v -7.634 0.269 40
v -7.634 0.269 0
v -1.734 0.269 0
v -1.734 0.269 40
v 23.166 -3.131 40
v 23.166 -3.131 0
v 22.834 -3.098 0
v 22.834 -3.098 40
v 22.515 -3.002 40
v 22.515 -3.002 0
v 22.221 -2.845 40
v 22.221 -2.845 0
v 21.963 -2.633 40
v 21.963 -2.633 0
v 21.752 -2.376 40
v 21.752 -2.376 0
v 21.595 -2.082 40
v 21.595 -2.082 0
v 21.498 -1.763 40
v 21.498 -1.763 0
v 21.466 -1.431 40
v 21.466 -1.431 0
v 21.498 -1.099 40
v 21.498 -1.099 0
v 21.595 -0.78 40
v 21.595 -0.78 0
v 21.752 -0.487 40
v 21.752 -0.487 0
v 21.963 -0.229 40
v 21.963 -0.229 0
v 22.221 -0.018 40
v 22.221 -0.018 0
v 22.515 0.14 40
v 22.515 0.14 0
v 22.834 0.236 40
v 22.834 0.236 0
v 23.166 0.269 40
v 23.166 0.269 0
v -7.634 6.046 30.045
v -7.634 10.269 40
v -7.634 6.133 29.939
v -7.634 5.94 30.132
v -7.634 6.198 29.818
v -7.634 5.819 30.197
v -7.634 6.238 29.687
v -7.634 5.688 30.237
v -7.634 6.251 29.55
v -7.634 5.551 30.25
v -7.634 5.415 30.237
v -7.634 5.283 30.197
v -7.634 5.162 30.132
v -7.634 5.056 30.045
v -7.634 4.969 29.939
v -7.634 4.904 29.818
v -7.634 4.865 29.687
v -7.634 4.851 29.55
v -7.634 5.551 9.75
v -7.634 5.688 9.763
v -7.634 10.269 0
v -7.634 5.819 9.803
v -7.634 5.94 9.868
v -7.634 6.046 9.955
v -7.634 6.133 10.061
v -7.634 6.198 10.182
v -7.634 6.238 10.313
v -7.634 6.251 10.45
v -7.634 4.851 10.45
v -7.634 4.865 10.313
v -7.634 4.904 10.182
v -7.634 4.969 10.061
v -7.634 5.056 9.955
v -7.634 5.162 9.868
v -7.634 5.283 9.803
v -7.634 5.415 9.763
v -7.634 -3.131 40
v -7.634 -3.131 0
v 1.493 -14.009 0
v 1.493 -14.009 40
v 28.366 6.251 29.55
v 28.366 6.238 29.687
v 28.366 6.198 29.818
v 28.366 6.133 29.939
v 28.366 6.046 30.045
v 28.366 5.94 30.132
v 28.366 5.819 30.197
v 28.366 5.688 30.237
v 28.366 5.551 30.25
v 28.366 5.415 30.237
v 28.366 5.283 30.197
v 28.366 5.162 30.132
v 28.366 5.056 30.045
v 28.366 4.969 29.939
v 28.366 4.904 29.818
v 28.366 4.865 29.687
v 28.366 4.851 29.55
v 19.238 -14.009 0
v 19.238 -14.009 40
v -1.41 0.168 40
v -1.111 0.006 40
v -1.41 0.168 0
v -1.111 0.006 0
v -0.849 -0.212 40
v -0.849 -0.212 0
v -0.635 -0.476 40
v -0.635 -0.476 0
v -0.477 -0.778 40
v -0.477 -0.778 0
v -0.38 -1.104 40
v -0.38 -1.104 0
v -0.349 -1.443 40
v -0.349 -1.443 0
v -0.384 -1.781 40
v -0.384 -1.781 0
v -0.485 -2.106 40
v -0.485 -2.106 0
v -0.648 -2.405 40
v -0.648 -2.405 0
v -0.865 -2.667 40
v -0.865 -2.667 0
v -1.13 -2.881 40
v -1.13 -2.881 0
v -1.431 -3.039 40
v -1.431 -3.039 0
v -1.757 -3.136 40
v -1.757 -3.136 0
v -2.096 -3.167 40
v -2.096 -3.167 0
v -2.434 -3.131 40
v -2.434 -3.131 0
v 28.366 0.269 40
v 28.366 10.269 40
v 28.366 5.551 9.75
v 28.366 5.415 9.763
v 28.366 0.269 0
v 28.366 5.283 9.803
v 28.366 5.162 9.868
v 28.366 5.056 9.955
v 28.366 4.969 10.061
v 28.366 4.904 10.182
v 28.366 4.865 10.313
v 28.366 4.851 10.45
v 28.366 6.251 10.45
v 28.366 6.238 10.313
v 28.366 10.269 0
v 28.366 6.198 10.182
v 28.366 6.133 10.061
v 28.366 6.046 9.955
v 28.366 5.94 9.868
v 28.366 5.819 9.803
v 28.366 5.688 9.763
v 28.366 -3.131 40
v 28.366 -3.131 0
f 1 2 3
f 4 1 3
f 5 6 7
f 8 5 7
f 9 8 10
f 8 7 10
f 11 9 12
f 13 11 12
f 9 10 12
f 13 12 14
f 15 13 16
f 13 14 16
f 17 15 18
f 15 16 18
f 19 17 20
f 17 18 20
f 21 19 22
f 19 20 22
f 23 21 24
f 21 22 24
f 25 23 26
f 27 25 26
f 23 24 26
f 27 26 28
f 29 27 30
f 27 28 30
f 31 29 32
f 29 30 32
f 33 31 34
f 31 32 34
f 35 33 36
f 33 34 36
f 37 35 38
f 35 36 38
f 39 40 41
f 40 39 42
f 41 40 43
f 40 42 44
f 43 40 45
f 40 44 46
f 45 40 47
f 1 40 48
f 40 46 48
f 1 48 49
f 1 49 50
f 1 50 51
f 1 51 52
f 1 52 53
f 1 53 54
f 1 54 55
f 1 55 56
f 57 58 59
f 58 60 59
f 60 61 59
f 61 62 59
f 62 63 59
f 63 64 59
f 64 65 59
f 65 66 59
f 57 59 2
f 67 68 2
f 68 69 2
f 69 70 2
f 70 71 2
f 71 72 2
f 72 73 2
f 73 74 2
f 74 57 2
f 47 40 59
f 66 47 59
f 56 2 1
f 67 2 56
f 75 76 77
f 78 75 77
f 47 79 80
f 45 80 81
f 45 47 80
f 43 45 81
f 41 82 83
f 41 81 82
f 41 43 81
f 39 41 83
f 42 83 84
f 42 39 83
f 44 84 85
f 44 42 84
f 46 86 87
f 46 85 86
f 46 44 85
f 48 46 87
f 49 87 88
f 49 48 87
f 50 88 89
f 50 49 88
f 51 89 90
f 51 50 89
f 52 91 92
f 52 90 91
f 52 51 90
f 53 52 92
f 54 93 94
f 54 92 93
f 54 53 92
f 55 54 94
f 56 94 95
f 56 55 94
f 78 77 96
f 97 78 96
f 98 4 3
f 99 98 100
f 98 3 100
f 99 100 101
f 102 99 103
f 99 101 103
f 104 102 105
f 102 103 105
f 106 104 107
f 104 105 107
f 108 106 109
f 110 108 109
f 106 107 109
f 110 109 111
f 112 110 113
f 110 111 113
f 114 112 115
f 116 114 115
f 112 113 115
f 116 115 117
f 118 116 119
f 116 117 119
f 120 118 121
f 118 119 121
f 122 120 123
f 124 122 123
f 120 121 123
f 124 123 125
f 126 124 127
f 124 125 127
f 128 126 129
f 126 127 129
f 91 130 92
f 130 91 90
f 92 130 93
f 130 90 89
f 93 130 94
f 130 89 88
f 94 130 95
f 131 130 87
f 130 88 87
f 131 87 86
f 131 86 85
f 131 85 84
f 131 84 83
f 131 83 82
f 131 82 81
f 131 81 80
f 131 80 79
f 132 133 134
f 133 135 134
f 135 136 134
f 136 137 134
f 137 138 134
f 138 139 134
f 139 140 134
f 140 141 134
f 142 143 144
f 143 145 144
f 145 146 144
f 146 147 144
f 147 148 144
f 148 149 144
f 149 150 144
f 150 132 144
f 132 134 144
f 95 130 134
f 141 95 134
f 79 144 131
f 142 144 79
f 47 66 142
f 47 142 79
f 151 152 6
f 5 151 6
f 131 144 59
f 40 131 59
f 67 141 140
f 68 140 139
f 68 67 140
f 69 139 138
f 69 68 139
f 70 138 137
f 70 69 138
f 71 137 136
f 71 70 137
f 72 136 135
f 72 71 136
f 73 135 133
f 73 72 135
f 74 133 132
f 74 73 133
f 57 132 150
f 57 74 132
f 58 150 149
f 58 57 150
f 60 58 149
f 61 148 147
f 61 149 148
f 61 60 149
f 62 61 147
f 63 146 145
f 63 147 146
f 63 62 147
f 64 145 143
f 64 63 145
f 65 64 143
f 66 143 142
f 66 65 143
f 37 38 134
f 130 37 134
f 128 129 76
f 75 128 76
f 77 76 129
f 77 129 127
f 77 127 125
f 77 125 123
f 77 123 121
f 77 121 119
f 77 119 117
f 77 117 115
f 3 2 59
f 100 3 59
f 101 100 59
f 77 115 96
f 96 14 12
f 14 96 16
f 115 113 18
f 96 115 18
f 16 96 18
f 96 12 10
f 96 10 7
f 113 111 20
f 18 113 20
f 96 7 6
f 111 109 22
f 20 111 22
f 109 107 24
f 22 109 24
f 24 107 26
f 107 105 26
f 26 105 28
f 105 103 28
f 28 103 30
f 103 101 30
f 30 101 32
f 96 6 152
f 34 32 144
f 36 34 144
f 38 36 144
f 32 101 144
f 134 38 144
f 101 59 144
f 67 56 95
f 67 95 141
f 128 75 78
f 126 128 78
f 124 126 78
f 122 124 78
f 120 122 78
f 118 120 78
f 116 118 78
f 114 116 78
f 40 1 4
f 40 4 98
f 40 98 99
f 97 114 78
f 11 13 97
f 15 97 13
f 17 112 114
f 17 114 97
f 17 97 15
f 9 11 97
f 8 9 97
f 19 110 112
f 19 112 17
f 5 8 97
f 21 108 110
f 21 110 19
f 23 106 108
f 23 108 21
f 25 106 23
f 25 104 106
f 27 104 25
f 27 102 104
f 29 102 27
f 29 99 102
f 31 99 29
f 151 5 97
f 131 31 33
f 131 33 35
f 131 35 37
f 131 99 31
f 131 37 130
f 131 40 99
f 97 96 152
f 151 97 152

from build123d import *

# Parameters (mm, degrees)
BOSS_EXTRUDE3_DEPTH = 40
CUT_EXTRUDE1_DEPTH  = 72


# Read off the part's stored shape, not the designer's step: Boss-Extrude3
with BuildPart() as part:
    # Boss-Extrude3 outline → Boss-Extrude3 (new body)
    with BuildSketch(Plane.XY):
        with BuildLine():
            Line((28.365517241, -3.131034483), (23.165517241, -3.131034483))
            ThreePointArc((23.165517241, -3.131034483), (21.465517241, -1.431034483), (23.165517241, 0.268965517))
            Line((23.165517241, 0.268965517), (28.365517241, 0.268965517))
            Line((28.365517241, 0.268965517), (28.365517241, 10.268965517))
            Line((28.365517241, 10.268965517), (-7.634482759, 10.268965517))
            Line((-7.634482759, 10.268965517), (-7.634482759, 0.268965517))
            Line((-7.634482759, 0.268965517), (-1.734482759, 0.268965517))
            ThreePointArc((-1.734482759, 0.268965517), (-0.384482759, -1.781034483), (-2.434482759, -3.131034483))
            Line((-2.434482759, -3.131034483), (-7.634482759, -3.131034483))
            Line((-7.634482759, -3.131034483), (1.493101299, -14.008865575))
            Line((1.493101299, -14.008865575), (19.237933184, -14.008865575))
            Line((19.237933184, -14.008865575), (28.365517241, -3.131034483))
        make_face()
    extrude(amount=BOSS_EXTRUDE3_DEPTH)

    # Sketch4 → Cut-Extrude1 (cut)
    with BuildSketch(Plane.ZY.offset(7.634482759)):
        with BuildLine():
            Line((10.45, 6.251111401), (29.55, 6.251111401))
            ThreePointArc((29.55, 6.251111401), (30.25, 5.551111401), (29.55, 4.851111401))
            Line((29.55, 4.851111401), (10.45, 4.851111401))
            ThreePointArc((10.45, 4.851111401), (9.75, 5.551111401), (10.45, 6.251111401))
        make_face()
    extrude(amount=-CUT_EXTRUDE1_DEPTH, mode=Mode.SUBTRACT)


solid = part.part
